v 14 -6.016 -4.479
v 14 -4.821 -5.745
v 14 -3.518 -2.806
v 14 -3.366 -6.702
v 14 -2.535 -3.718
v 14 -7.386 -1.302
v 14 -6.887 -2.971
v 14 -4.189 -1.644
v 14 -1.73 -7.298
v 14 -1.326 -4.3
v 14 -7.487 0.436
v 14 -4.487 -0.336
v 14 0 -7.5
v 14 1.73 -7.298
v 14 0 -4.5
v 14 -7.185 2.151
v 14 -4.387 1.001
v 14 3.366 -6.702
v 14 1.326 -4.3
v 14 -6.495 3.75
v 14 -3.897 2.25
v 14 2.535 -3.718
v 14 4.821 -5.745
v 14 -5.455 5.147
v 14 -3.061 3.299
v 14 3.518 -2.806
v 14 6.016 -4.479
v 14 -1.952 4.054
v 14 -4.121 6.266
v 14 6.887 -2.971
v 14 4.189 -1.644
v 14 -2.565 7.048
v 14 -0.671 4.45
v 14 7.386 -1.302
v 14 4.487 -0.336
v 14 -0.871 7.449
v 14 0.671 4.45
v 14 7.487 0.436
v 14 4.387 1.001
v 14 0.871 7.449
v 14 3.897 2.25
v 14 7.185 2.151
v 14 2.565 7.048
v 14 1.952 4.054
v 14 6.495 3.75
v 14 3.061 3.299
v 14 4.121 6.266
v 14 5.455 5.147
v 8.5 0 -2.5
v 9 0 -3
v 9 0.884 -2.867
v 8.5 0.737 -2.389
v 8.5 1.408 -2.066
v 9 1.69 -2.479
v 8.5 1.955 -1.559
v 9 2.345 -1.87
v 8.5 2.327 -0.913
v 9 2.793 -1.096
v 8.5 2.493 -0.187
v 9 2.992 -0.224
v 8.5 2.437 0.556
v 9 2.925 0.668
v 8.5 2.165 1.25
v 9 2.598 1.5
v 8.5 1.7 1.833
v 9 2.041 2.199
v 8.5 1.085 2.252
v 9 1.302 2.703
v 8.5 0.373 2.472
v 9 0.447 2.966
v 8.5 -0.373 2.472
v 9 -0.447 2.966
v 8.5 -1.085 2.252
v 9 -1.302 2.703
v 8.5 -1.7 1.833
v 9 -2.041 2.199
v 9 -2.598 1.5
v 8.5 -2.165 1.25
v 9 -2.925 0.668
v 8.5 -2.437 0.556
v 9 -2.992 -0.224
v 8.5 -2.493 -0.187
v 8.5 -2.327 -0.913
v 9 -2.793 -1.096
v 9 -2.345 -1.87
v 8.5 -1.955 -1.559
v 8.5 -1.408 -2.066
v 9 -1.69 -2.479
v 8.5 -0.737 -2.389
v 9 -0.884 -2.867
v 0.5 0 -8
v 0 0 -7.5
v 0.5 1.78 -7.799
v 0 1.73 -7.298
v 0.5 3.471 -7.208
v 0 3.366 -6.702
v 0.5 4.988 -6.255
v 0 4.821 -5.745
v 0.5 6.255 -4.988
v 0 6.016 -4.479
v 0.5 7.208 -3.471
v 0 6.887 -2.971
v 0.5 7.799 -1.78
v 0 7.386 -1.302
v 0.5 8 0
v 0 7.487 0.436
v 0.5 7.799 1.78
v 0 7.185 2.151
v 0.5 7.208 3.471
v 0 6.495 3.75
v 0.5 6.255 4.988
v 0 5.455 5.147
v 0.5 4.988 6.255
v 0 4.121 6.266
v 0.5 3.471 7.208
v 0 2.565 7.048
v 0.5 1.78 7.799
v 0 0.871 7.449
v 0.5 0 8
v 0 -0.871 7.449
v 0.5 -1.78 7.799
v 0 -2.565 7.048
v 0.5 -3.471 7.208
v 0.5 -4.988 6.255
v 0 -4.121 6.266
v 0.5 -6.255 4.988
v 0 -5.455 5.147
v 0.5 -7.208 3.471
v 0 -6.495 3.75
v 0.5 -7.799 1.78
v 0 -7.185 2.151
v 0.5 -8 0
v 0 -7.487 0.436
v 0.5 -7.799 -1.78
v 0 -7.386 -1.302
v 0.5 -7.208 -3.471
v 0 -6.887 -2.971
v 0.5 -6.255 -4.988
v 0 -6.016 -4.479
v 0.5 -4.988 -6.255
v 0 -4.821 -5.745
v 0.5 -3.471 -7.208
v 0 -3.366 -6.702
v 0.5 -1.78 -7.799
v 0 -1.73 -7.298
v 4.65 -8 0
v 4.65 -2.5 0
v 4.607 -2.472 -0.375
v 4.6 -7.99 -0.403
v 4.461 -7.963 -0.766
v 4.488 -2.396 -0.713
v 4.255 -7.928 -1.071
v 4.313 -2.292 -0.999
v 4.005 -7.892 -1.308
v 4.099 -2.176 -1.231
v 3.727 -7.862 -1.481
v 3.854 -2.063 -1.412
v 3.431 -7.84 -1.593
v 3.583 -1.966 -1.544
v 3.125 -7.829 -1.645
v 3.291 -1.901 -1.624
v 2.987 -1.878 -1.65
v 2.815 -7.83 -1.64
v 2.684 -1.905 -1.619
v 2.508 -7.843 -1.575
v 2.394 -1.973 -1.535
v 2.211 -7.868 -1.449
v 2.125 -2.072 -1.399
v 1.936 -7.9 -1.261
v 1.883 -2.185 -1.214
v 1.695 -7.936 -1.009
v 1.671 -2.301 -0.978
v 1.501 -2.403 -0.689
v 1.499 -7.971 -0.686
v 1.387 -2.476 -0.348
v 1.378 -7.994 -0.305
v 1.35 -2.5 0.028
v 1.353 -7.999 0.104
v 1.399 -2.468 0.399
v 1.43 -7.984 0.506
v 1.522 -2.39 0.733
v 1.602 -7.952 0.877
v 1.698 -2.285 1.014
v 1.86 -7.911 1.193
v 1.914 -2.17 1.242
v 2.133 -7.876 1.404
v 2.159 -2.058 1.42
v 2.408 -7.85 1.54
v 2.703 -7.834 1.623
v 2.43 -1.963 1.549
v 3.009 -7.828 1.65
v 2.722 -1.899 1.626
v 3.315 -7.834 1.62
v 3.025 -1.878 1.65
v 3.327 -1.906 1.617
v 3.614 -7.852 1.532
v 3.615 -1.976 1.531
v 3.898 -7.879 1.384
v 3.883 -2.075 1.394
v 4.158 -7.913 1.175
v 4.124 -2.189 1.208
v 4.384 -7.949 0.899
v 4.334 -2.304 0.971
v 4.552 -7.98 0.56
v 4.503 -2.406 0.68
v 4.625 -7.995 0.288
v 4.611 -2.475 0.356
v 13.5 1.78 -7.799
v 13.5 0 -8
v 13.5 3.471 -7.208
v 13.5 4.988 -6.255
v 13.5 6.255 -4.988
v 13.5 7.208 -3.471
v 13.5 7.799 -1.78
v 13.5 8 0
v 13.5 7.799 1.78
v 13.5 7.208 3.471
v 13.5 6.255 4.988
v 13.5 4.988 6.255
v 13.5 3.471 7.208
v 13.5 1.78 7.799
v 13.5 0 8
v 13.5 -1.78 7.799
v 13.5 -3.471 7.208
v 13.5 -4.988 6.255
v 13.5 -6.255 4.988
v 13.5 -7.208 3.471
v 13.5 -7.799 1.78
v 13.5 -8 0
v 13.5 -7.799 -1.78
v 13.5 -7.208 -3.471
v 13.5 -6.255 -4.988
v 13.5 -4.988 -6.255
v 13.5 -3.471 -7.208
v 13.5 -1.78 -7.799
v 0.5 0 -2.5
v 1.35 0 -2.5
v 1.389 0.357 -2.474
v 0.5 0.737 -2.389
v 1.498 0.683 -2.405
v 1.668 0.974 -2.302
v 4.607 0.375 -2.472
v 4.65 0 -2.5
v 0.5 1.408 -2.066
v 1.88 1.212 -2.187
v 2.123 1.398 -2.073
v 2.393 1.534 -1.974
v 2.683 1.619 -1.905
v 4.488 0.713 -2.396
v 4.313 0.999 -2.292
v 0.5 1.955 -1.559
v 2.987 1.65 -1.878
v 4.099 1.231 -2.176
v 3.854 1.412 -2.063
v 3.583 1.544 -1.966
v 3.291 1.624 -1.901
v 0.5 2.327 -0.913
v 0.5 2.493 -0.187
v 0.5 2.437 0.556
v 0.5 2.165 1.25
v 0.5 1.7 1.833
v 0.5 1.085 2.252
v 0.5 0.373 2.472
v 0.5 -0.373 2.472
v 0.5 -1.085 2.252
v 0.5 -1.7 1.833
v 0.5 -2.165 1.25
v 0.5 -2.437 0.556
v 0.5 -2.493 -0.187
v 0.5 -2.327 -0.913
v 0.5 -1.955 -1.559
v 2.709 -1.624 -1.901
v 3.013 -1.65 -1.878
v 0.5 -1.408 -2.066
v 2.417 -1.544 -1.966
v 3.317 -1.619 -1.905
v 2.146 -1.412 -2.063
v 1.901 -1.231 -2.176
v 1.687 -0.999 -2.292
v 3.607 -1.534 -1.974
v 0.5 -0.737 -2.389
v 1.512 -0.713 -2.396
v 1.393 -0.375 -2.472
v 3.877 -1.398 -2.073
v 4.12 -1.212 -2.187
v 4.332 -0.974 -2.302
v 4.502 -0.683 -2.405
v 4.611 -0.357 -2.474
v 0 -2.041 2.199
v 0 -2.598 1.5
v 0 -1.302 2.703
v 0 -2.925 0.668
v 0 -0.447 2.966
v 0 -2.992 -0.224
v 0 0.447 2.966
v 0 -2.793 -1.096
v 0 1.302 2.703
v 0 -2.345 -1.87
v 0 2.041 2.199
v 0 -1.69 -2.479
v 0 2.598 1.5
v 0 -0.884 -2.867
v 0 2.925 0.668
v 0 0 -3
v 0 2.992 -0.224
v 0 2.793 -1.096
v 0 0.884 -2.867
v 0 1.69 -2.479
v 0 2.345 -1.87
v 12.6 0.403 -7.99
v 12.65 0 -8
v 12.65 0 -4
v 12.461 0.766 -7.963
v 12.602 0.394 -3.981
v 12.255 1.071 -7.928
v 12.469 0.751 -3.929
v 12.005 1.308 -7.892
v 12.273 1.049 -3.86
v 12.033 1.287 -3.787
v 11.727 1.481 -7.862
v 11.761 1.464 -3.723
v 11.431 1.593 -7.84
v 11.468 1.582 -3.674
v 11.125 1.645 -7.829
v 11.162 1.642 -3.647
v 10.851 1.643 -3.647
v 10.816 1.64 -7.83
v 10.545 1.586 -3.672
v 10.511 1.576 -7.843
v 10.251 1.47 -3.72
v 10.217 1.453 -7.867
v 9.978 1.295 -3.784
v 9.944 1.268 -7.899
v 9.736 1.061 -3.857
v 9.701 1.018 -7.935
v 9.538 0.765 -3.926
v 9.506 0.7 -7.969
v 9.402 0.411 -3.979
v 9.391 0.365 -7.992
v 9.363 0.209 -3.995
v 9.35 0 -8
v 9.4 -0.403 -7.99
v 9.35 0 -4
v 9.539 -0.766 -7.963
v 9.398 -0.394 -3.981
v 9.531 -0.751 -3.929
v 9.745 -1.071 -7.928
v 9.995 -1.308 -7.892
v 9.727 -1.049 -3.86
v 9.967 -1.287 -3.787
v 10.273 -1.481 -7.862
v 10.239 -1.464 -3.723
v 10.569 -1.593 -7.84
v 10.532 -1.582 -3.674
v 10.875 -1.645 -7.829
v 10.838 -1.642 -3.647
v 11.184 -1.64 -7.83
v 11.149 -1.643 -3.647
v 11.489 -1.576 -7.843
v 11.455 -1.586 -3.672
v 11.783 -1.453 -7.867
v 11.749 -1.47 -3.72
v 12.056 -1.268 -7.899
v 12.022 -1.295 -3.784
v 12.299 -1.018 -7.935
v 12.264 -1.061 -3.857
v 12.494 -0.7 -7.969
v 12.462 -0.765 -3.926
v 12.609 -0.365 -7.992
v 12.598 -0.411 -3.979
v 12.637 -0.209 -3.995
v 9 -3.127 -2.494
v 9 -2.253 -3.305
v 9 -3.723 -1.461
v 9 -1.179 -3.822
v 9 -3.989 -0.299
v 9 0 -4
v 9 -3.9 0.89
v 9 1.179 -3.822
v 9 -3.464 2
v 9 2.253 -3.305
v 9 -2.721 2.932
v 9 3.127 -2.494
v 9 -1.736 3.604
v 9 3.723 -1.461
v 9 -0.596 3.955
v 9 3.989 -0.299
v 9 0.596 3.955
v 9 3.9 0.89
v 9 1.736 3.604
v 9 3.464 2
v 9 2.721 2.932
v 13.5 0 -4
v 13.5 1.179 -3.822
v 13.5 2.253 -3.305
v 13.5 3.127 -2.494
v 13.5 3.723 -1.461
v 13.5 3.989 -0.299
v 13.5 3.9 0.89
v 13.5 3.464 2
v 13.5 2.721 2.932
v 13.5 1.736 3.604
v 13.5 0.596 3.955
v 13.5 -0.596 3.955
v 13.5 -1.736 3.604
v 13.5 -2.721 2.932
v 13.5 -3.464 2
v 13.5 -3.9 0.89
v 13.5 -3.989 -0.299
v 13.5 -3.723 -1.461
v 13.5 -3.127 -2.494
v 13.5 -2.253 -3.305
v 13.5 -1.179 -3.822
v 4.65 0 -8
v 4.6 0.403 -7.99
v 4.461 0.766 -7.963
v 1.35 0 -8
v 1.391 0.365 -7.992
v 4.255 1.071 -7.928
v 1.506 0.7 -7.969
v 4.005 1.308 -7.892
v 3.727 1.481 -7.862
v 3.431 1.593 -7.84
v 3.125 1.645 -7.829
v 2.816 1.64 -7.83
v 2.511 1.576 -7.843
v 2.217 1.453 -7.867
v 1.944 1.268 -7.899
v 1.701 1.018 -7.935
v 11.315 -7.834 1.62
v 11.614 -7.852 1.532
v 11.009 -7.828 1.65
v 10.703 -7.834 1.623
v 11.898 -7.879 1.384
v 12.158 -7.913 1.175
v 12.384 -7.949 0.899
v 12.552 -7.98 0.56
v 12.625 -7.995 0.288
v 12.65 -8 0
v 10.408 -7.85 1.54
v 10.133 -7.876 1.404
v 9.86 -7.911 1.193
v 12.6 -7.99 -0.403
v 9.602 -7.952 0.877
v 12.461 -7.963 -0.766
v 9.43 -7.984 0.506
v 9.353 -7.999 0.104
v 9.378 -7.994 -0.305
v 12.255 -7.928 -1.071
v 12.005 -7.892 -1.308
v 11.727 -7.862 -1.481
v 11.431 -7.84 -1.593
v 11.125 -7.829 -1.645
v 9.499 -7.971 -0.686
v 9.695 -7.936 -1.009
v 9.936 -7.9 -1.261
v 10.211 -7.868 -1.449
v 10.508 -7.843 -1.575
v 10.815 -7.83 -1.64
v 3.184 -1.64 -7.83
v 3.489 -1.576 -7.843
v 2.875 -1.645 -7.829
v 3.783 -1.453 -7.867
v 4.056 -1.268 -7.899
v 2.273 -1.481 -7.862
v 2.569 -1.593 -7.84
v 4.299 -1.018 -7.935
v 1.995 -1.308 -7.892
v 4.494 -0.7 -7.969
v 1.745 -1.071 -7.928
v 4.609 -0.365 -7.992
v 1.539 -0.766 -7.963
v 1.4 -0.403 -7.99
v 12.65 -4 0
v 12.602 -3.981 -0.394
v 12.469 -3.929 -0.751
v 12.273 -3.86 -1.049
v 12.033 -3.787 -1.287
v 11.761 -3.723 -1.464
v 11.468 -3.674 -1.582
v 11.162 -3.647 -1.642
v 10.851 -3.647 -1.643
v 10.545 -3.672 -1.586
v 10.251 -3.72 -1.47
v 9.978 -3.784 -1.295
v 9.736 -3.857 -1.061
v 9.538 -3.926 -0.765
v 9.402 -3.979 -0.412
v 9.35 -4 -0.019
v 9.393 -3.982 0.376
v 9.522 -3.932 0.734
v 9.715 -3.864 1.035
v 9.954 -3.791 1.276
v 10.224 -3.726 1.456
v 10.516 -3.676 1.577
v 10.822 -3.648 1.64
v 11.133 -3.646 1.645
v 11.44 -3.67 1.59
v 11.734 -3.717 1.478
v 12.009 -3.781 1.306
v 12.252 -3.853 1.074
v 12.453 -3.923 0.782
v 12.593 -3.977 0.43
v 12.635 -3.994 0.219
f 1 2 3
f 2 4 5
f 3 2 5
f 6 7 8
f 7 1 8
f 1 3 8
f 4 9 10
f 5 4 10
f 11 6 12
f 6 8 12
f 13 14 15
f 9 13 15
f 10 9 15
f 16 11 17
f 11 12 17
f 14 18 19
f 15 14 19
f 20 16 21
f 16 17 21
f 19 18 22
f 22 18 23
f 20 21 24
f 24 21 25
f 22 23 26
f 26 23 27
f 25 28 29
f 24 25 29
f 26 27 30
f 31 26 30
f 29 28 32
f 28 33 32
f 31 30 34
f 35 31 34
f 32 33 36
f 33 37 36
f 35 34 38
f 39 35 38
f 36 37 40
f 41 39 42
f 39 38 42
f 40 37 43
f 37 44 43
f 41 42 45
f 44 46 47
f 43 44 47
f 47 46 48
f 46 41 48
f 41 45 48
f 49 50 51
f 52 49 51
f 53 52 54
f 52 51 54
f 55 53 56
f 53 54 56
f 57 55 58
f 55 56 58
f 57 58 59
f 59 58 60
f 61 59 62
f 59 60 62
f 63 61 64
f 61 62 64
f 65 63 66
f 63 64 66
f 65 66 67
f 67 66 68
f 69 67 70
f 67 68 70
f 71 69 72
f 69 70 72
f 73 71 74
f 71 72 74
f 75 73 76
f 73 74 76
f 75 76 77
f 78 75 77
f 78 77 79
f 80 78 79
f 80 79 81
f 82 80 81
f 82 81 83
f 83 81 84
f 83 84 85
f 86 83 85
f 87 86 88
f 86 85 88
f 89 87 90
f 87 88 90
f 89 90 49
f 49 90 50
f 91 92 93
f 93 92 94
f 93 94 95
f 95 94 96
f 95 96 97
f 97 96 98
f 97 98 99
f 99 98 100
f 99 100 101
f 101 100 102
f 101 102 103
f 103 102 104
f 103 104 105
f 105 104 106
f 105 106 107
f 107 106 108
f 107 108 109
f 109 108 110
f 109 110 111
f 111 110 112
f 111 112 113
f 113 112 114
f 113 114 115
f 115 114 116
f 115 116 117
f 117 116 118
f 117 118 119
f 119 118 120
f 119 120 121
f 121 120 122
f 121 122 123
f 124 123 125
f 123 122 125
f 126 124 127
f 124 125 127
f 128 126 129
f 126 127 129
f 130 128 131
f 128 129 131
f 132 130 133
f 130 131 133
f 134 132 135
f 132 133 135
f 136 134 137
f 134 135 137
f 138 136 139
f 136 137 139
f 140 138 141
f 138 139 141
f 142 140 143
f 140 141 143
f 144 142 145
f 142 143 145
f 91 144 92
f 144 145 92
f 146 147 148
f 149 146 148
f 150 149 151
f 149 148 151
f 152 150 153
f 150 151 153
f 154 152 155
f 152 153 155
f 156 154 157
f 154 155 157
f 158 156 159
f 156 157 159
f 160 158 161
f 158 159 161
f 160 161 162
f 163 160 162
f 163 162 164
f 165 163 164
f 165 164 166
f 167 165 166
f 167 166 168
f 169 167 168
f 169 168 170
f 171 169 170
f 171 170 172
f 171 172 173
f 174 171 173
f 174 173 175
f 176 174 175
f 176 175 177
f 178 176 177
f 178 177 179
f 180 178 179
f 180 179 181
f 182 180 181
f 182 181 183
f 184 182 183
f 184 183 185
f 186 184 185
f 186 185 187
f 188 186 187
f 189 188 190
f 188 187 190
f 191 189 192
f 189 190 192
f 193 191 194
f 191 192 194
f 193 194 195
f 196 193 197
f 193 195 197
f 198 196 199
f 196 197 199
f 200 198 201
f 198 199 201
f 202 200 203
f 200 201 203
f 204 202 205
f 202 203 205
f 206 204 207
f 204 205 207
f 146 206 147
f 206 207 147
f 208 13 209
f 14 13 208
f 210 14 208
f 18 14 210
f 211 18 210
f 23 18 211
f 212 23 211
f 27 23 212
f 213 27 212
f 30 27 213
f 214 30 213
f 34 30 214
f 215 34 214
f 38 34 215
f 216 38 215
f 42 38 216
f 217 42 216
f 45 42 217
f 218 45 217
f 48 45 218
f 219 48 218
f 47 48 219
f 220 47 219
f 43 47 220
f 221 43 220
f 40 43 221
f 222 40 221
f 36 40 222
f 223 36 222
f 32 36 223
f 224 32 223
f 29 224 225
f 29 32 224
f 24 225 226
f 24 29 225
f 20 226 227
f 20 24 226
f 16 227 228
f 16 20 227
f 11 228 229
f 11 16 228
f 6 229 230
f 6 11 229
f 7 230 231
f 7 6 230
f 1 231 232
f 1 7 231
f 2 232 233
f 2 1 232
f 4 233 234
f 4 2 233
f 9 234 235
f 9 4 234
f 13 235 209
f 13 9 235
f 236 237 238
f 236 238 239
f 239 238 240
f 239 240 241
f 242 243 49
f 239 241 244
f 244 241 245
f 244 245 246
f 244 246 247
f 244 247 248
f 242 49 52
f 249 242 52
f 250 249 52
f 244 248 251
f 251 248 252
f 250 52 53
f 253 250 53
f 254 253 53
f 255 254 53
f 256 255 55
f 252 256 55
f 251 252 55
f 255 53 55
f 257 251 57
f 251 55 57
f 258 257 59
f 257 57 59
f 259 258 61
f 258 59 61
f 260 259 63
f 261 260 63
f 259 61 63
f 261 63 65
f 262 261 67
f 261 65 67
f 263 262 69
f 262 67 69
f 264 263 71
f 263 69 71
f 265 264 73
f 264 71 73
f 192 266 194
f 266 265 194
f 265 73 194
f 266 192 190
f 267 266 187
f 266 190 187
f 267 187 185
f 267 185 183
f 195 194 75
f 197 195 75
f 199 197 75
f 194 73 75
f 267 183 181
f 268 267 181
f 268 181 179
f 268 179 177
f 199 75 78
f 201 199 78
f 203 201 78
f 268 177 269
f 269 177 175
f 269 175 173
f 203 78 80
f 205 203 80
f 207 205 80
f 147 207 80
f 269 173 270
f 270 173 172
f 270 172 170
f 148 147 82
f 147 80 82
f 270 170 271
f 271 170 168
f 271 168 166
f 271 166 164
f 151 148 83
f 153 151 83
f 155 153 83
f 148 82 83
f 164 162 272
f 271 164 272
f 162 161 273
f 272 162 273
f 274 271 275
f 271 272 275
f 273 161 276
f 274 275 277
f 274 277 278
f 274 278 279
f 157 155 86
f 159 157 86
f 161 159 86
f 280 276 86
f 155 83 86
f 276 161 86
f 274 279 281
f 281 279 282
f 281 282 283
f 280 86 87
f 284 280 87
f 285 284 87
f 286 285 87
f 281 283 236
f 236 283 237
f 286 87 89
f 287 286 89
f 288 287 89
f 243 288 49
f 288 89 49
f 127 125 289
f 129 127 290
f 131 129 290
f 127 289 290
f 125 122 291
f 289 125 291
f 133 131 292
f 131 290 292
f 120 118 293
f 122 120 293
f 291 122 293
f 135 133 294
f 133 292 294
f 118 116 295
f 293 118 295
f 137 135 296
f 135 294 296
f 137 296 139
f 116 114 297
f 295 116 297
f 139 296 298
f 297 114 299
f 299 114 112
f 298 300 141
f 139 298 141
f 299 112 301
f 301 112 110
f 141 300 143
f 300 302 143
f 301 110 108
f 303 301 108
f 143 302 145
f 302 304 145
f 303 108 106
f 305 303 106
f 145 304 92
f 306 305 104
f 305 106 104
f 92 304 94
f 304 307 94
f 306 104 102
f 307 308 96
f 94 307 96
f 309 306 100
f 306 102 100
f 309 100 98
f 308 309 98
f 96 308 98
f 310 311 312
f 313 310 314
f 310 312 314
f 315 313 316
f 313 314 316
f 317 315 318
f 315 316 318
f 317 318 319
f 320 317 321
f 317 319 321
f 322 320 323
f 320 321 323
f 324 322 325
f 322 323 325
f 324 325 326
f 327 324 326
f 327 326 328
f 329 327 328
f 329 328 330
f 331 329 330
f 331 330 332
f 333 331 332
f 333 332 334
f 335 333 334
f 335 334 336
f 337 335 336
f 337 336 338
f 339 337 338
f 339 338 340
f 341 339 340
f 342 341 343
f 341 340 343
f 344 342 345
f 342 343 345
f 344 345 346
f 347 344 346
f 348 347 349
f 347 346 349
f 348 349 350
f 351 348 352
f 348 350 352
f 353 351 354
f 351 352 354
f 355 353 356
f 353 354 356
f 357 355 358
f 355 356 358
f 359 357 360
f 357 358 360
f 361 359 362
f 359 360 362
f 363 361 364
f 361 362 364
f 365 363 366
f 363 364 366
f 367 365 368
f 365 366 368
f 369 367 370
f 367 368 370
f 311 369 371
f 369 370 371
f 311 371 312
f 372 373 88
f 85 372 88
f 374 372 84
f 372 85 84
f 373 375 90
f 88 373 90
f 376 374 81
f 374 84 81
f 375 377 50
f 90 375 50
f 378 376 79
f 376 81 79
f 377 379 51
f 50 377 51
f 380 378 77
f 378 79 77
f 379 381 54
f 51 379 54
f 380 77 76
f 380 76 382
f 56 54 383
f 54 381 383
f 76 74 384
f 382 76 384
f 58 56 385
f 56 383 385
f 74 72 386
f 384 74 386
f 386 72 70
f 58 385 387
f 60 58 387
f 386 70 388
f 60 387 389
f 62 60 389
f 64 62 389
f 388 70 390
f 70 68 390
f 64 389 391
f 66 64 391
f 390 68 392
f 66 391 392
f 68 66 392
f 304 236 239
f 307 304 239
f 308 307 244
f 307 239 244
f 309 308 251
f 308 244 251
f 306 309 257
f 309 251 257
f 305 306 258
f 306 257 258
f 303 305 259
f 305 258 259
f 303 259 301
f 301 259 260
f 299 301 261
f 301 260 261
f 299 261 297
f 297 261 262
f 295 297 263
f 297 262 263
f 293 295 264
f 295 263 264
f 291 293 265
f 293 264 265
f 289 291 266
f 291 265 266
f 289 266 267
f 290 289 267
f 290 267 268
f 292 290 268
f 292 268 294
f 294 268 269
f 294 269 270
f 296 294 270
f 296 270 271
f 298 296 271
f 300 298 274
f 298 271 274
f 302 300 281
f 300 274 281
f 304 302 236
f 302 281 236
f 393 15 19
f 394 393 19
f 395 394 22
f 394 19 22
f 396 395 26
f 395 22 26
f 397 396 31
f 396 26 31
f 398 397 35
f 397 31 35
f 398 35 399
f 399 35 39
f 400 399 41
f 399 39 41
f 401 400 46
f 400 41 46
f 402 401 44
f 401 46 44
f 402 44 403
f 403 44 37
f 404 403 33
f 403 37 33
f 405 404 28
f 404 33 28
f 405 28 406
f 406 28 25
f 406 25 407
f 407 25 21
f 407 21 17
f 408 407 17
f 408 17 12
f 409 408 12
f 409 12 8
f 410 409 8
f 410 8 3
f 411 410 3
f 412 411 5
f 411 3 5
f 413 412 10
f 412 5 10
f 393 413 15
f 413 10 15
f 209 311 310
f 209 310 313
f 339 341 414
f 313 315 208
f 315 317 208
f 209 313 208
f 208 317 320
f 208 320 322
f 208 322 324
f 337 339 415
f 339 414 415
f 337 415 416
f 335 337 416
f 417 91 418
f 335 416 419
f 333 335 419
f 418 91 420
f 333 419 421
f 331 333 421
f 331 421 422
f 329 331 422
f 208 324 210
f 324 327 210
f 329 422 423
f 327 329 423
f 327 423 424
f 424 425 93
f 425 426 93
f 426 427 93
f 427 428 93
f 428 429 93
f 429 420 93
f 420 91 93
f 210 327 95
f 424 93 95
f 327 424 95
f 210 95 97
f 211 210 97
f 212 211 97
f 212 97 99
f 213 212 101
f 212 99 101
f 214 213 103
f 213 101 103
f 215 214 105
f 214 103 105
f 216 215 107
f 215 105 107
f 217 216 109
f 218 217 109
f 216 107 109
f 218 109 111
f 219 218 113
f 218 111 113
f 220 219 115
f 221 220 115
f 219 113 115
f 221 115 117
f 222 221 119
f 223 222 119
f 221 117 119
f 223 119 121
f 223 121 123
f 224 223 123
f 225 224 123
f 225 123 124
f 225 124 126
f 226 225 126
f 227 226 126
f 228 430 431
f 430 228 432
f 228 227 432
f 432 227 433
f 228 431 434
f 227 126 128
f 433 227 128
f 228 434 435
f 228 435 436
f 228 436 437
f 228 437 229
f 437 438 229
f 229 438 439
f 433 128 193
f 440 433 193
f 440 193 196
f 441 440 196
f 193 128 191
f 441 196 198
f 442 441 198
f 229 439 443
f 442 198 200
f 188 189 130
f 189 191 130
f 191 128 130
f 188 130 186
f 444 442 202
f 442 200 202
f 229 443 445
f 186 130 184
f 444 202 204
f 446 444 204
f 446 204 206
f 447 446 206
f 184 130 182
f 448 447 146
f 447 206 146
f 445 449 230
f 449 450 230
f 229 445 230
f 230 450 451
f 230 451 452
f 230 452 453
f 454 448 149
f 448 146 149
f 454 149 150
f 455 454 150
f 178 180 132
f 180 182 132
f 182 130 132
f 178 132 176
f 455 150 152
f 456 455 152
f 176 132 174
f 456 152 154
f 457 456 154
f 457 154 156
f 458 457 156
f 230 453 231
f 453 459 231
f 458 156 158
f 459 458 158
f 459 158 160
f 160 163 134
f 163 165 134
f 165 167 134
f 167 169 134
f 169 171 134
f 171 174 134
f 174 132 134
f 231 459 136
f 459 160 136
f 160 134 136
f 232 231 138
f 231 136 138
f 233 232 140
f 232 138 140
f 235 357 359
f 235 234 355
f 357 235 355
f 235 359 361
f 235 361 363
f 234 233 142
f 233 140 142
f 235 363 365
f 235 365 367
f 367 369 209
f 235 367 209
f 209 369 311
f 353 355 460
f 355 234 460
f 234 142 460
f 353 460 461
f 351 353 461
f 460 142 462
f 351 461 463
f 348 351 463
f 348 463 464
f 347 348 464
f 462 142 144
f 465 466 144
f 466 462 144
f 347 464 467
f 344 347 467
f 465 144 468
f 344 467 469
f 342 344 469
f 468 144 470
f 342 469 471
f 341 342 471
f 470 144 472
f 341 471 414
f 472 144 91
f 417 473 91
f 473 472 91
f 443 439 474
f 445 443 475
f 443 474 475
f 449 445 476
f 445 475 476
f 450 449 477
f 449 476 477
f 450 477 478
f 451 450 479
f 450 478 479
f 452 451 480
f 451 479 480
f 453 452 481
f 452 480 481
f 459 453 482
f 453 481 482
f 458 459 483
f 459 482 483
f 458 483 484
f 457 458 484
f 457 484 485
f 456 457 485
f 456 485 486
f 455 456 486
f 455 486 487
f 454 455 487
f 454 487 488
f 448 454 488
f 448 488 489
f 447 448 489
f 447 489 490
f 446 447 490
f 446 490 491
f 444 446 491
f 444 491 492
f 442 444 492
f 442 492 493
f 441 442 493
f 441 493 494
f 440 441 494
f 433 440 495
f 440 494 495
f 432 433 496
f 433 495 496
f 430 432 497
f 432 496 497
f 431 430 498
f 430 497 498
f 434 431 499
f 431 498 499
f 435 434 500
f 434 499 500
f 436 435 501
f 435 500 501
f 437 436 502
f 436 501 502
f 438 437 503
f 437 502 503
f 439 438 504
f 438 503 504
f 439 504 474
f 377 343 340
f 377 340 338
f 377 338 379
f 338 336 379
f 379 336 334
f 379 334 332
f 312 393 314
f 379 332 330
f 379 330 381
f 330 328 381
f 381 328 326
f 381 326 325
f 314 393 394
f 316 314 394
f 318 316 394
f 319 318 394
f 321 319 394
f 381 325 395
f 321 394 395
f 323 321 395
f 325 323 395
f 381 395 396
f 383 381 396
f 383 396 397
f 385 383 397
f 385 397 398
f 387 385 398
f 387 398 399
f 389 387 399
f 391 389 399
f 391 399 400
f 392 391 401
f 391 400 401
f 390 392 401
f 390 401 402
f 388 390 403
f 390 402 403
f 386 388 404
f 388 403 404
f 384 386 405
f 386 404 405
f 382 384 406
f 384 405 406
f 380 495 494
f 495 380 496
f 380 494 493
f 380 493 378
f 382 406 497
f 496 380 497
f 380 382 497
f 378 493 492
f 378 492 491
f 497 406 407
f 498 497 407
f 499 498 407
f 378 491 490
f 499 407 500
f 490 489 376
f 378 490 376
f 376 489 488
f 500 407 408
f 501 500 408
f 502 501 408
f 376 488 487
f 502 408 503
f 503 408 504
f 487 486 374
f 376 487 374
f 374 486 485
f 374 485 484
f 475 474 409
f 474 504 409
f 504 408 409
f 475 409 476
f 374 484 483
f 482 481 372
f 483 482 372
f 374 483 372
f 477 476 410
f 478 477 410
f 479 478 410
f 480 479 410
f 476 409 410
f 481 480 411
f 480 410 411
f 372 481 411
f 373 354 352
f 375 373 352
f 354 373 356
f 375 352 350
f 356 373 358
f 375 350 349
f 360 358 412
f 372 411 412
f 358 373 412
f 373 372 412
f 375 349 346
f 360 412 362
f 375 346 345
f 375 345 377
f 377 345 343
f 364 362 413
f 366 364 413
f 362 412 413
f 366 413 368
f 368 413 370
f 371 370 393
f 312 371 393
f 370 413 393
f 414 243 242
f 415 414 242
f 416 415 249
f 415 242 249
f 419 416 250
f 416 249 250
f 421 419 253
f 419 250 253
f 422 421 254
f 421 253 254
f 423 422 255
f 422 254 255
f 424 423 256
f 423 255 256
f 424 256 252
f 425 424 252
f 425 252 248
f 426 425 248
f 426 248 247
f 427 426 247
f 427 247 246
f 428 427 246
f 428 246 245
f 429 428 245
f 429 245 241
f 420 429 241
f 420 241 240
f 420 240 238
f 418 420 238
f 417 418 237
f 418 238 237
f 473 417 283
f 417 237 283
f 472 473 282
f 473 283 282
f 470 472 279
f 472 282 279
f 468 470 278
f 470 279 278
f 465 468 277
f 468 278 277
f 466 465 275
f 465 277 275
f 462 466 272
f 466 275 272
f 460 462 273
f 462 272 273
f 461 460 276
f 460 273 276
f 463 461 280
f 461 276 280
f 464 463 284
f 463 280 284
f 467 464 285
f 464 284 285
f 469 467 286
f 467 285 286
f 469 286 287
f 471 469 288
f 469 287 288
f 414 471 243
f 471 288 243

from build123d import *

# Parameters (mm, degrees)
CHAMFER_1_SIZE      = 0.5
SKETCH_2_R          = 1.65
CUT_EXTRUDE_1_DEPTH = 10
SKETCH_3_R          = 1.65
CUT_EXTRUDE_2_DEPTH = 10


with BuildPart() as part:
    # 草图1 → 旋转1 (revolve)
    with BuildSketch(Plane(origin=(0, 0, 0), x_dir=(1, 0, 0), z_dir=(0, 1, 0))):
        Polygon((14, 8), (0, 8), (0, 2.5), (9, 2.5), (9, 4), (14, 4), align=None)
    revolve(axis=Axis((-5, 0, 0), (1, 0, 0)))

    # 倒角1
    chamfer_1_edges = [part.edges().sort_by_distance(p)[0] for p in [
        (14, 0, 4),
        (9, 0, 2.5),
        (0, 0, 2.5),
        (0, 0, 8),
        (14, 0, 8),
    ]]
    chamfer(chamfer_1_edges, length=CHAMFER_1_SIZE)

    # 草图2 → 切除-拉伸1 (cut)
    with BuildSketch(Plane(origin=(0, 0, 0), x_dir=(1, 0, 0), z_dir=(0, 1, 0))):
        with Locations((3, 0)):
            Circle(SKETCH_2_R)
        with Locations((11, 0)):
            Circle(SKETCH_2_R)
    extrude(amount=-CUT_EXTRUDE_1_DEPTH, mode=Mode.SUBTRACT)

    # 草图3 → 切除-拉伸2 (cut)
    with BuildSketch(Plane.XY):
        with Locations((3, 0)):
            Circle(SKETCH_3_R)
        with Locations((11, 0)):
            Circle(SKETCH_3_R)
    extrude(amount=-CUT_EXTRUDE_2_DEPTH, mode=Mode.SUBTRACT)


solid = part.part
